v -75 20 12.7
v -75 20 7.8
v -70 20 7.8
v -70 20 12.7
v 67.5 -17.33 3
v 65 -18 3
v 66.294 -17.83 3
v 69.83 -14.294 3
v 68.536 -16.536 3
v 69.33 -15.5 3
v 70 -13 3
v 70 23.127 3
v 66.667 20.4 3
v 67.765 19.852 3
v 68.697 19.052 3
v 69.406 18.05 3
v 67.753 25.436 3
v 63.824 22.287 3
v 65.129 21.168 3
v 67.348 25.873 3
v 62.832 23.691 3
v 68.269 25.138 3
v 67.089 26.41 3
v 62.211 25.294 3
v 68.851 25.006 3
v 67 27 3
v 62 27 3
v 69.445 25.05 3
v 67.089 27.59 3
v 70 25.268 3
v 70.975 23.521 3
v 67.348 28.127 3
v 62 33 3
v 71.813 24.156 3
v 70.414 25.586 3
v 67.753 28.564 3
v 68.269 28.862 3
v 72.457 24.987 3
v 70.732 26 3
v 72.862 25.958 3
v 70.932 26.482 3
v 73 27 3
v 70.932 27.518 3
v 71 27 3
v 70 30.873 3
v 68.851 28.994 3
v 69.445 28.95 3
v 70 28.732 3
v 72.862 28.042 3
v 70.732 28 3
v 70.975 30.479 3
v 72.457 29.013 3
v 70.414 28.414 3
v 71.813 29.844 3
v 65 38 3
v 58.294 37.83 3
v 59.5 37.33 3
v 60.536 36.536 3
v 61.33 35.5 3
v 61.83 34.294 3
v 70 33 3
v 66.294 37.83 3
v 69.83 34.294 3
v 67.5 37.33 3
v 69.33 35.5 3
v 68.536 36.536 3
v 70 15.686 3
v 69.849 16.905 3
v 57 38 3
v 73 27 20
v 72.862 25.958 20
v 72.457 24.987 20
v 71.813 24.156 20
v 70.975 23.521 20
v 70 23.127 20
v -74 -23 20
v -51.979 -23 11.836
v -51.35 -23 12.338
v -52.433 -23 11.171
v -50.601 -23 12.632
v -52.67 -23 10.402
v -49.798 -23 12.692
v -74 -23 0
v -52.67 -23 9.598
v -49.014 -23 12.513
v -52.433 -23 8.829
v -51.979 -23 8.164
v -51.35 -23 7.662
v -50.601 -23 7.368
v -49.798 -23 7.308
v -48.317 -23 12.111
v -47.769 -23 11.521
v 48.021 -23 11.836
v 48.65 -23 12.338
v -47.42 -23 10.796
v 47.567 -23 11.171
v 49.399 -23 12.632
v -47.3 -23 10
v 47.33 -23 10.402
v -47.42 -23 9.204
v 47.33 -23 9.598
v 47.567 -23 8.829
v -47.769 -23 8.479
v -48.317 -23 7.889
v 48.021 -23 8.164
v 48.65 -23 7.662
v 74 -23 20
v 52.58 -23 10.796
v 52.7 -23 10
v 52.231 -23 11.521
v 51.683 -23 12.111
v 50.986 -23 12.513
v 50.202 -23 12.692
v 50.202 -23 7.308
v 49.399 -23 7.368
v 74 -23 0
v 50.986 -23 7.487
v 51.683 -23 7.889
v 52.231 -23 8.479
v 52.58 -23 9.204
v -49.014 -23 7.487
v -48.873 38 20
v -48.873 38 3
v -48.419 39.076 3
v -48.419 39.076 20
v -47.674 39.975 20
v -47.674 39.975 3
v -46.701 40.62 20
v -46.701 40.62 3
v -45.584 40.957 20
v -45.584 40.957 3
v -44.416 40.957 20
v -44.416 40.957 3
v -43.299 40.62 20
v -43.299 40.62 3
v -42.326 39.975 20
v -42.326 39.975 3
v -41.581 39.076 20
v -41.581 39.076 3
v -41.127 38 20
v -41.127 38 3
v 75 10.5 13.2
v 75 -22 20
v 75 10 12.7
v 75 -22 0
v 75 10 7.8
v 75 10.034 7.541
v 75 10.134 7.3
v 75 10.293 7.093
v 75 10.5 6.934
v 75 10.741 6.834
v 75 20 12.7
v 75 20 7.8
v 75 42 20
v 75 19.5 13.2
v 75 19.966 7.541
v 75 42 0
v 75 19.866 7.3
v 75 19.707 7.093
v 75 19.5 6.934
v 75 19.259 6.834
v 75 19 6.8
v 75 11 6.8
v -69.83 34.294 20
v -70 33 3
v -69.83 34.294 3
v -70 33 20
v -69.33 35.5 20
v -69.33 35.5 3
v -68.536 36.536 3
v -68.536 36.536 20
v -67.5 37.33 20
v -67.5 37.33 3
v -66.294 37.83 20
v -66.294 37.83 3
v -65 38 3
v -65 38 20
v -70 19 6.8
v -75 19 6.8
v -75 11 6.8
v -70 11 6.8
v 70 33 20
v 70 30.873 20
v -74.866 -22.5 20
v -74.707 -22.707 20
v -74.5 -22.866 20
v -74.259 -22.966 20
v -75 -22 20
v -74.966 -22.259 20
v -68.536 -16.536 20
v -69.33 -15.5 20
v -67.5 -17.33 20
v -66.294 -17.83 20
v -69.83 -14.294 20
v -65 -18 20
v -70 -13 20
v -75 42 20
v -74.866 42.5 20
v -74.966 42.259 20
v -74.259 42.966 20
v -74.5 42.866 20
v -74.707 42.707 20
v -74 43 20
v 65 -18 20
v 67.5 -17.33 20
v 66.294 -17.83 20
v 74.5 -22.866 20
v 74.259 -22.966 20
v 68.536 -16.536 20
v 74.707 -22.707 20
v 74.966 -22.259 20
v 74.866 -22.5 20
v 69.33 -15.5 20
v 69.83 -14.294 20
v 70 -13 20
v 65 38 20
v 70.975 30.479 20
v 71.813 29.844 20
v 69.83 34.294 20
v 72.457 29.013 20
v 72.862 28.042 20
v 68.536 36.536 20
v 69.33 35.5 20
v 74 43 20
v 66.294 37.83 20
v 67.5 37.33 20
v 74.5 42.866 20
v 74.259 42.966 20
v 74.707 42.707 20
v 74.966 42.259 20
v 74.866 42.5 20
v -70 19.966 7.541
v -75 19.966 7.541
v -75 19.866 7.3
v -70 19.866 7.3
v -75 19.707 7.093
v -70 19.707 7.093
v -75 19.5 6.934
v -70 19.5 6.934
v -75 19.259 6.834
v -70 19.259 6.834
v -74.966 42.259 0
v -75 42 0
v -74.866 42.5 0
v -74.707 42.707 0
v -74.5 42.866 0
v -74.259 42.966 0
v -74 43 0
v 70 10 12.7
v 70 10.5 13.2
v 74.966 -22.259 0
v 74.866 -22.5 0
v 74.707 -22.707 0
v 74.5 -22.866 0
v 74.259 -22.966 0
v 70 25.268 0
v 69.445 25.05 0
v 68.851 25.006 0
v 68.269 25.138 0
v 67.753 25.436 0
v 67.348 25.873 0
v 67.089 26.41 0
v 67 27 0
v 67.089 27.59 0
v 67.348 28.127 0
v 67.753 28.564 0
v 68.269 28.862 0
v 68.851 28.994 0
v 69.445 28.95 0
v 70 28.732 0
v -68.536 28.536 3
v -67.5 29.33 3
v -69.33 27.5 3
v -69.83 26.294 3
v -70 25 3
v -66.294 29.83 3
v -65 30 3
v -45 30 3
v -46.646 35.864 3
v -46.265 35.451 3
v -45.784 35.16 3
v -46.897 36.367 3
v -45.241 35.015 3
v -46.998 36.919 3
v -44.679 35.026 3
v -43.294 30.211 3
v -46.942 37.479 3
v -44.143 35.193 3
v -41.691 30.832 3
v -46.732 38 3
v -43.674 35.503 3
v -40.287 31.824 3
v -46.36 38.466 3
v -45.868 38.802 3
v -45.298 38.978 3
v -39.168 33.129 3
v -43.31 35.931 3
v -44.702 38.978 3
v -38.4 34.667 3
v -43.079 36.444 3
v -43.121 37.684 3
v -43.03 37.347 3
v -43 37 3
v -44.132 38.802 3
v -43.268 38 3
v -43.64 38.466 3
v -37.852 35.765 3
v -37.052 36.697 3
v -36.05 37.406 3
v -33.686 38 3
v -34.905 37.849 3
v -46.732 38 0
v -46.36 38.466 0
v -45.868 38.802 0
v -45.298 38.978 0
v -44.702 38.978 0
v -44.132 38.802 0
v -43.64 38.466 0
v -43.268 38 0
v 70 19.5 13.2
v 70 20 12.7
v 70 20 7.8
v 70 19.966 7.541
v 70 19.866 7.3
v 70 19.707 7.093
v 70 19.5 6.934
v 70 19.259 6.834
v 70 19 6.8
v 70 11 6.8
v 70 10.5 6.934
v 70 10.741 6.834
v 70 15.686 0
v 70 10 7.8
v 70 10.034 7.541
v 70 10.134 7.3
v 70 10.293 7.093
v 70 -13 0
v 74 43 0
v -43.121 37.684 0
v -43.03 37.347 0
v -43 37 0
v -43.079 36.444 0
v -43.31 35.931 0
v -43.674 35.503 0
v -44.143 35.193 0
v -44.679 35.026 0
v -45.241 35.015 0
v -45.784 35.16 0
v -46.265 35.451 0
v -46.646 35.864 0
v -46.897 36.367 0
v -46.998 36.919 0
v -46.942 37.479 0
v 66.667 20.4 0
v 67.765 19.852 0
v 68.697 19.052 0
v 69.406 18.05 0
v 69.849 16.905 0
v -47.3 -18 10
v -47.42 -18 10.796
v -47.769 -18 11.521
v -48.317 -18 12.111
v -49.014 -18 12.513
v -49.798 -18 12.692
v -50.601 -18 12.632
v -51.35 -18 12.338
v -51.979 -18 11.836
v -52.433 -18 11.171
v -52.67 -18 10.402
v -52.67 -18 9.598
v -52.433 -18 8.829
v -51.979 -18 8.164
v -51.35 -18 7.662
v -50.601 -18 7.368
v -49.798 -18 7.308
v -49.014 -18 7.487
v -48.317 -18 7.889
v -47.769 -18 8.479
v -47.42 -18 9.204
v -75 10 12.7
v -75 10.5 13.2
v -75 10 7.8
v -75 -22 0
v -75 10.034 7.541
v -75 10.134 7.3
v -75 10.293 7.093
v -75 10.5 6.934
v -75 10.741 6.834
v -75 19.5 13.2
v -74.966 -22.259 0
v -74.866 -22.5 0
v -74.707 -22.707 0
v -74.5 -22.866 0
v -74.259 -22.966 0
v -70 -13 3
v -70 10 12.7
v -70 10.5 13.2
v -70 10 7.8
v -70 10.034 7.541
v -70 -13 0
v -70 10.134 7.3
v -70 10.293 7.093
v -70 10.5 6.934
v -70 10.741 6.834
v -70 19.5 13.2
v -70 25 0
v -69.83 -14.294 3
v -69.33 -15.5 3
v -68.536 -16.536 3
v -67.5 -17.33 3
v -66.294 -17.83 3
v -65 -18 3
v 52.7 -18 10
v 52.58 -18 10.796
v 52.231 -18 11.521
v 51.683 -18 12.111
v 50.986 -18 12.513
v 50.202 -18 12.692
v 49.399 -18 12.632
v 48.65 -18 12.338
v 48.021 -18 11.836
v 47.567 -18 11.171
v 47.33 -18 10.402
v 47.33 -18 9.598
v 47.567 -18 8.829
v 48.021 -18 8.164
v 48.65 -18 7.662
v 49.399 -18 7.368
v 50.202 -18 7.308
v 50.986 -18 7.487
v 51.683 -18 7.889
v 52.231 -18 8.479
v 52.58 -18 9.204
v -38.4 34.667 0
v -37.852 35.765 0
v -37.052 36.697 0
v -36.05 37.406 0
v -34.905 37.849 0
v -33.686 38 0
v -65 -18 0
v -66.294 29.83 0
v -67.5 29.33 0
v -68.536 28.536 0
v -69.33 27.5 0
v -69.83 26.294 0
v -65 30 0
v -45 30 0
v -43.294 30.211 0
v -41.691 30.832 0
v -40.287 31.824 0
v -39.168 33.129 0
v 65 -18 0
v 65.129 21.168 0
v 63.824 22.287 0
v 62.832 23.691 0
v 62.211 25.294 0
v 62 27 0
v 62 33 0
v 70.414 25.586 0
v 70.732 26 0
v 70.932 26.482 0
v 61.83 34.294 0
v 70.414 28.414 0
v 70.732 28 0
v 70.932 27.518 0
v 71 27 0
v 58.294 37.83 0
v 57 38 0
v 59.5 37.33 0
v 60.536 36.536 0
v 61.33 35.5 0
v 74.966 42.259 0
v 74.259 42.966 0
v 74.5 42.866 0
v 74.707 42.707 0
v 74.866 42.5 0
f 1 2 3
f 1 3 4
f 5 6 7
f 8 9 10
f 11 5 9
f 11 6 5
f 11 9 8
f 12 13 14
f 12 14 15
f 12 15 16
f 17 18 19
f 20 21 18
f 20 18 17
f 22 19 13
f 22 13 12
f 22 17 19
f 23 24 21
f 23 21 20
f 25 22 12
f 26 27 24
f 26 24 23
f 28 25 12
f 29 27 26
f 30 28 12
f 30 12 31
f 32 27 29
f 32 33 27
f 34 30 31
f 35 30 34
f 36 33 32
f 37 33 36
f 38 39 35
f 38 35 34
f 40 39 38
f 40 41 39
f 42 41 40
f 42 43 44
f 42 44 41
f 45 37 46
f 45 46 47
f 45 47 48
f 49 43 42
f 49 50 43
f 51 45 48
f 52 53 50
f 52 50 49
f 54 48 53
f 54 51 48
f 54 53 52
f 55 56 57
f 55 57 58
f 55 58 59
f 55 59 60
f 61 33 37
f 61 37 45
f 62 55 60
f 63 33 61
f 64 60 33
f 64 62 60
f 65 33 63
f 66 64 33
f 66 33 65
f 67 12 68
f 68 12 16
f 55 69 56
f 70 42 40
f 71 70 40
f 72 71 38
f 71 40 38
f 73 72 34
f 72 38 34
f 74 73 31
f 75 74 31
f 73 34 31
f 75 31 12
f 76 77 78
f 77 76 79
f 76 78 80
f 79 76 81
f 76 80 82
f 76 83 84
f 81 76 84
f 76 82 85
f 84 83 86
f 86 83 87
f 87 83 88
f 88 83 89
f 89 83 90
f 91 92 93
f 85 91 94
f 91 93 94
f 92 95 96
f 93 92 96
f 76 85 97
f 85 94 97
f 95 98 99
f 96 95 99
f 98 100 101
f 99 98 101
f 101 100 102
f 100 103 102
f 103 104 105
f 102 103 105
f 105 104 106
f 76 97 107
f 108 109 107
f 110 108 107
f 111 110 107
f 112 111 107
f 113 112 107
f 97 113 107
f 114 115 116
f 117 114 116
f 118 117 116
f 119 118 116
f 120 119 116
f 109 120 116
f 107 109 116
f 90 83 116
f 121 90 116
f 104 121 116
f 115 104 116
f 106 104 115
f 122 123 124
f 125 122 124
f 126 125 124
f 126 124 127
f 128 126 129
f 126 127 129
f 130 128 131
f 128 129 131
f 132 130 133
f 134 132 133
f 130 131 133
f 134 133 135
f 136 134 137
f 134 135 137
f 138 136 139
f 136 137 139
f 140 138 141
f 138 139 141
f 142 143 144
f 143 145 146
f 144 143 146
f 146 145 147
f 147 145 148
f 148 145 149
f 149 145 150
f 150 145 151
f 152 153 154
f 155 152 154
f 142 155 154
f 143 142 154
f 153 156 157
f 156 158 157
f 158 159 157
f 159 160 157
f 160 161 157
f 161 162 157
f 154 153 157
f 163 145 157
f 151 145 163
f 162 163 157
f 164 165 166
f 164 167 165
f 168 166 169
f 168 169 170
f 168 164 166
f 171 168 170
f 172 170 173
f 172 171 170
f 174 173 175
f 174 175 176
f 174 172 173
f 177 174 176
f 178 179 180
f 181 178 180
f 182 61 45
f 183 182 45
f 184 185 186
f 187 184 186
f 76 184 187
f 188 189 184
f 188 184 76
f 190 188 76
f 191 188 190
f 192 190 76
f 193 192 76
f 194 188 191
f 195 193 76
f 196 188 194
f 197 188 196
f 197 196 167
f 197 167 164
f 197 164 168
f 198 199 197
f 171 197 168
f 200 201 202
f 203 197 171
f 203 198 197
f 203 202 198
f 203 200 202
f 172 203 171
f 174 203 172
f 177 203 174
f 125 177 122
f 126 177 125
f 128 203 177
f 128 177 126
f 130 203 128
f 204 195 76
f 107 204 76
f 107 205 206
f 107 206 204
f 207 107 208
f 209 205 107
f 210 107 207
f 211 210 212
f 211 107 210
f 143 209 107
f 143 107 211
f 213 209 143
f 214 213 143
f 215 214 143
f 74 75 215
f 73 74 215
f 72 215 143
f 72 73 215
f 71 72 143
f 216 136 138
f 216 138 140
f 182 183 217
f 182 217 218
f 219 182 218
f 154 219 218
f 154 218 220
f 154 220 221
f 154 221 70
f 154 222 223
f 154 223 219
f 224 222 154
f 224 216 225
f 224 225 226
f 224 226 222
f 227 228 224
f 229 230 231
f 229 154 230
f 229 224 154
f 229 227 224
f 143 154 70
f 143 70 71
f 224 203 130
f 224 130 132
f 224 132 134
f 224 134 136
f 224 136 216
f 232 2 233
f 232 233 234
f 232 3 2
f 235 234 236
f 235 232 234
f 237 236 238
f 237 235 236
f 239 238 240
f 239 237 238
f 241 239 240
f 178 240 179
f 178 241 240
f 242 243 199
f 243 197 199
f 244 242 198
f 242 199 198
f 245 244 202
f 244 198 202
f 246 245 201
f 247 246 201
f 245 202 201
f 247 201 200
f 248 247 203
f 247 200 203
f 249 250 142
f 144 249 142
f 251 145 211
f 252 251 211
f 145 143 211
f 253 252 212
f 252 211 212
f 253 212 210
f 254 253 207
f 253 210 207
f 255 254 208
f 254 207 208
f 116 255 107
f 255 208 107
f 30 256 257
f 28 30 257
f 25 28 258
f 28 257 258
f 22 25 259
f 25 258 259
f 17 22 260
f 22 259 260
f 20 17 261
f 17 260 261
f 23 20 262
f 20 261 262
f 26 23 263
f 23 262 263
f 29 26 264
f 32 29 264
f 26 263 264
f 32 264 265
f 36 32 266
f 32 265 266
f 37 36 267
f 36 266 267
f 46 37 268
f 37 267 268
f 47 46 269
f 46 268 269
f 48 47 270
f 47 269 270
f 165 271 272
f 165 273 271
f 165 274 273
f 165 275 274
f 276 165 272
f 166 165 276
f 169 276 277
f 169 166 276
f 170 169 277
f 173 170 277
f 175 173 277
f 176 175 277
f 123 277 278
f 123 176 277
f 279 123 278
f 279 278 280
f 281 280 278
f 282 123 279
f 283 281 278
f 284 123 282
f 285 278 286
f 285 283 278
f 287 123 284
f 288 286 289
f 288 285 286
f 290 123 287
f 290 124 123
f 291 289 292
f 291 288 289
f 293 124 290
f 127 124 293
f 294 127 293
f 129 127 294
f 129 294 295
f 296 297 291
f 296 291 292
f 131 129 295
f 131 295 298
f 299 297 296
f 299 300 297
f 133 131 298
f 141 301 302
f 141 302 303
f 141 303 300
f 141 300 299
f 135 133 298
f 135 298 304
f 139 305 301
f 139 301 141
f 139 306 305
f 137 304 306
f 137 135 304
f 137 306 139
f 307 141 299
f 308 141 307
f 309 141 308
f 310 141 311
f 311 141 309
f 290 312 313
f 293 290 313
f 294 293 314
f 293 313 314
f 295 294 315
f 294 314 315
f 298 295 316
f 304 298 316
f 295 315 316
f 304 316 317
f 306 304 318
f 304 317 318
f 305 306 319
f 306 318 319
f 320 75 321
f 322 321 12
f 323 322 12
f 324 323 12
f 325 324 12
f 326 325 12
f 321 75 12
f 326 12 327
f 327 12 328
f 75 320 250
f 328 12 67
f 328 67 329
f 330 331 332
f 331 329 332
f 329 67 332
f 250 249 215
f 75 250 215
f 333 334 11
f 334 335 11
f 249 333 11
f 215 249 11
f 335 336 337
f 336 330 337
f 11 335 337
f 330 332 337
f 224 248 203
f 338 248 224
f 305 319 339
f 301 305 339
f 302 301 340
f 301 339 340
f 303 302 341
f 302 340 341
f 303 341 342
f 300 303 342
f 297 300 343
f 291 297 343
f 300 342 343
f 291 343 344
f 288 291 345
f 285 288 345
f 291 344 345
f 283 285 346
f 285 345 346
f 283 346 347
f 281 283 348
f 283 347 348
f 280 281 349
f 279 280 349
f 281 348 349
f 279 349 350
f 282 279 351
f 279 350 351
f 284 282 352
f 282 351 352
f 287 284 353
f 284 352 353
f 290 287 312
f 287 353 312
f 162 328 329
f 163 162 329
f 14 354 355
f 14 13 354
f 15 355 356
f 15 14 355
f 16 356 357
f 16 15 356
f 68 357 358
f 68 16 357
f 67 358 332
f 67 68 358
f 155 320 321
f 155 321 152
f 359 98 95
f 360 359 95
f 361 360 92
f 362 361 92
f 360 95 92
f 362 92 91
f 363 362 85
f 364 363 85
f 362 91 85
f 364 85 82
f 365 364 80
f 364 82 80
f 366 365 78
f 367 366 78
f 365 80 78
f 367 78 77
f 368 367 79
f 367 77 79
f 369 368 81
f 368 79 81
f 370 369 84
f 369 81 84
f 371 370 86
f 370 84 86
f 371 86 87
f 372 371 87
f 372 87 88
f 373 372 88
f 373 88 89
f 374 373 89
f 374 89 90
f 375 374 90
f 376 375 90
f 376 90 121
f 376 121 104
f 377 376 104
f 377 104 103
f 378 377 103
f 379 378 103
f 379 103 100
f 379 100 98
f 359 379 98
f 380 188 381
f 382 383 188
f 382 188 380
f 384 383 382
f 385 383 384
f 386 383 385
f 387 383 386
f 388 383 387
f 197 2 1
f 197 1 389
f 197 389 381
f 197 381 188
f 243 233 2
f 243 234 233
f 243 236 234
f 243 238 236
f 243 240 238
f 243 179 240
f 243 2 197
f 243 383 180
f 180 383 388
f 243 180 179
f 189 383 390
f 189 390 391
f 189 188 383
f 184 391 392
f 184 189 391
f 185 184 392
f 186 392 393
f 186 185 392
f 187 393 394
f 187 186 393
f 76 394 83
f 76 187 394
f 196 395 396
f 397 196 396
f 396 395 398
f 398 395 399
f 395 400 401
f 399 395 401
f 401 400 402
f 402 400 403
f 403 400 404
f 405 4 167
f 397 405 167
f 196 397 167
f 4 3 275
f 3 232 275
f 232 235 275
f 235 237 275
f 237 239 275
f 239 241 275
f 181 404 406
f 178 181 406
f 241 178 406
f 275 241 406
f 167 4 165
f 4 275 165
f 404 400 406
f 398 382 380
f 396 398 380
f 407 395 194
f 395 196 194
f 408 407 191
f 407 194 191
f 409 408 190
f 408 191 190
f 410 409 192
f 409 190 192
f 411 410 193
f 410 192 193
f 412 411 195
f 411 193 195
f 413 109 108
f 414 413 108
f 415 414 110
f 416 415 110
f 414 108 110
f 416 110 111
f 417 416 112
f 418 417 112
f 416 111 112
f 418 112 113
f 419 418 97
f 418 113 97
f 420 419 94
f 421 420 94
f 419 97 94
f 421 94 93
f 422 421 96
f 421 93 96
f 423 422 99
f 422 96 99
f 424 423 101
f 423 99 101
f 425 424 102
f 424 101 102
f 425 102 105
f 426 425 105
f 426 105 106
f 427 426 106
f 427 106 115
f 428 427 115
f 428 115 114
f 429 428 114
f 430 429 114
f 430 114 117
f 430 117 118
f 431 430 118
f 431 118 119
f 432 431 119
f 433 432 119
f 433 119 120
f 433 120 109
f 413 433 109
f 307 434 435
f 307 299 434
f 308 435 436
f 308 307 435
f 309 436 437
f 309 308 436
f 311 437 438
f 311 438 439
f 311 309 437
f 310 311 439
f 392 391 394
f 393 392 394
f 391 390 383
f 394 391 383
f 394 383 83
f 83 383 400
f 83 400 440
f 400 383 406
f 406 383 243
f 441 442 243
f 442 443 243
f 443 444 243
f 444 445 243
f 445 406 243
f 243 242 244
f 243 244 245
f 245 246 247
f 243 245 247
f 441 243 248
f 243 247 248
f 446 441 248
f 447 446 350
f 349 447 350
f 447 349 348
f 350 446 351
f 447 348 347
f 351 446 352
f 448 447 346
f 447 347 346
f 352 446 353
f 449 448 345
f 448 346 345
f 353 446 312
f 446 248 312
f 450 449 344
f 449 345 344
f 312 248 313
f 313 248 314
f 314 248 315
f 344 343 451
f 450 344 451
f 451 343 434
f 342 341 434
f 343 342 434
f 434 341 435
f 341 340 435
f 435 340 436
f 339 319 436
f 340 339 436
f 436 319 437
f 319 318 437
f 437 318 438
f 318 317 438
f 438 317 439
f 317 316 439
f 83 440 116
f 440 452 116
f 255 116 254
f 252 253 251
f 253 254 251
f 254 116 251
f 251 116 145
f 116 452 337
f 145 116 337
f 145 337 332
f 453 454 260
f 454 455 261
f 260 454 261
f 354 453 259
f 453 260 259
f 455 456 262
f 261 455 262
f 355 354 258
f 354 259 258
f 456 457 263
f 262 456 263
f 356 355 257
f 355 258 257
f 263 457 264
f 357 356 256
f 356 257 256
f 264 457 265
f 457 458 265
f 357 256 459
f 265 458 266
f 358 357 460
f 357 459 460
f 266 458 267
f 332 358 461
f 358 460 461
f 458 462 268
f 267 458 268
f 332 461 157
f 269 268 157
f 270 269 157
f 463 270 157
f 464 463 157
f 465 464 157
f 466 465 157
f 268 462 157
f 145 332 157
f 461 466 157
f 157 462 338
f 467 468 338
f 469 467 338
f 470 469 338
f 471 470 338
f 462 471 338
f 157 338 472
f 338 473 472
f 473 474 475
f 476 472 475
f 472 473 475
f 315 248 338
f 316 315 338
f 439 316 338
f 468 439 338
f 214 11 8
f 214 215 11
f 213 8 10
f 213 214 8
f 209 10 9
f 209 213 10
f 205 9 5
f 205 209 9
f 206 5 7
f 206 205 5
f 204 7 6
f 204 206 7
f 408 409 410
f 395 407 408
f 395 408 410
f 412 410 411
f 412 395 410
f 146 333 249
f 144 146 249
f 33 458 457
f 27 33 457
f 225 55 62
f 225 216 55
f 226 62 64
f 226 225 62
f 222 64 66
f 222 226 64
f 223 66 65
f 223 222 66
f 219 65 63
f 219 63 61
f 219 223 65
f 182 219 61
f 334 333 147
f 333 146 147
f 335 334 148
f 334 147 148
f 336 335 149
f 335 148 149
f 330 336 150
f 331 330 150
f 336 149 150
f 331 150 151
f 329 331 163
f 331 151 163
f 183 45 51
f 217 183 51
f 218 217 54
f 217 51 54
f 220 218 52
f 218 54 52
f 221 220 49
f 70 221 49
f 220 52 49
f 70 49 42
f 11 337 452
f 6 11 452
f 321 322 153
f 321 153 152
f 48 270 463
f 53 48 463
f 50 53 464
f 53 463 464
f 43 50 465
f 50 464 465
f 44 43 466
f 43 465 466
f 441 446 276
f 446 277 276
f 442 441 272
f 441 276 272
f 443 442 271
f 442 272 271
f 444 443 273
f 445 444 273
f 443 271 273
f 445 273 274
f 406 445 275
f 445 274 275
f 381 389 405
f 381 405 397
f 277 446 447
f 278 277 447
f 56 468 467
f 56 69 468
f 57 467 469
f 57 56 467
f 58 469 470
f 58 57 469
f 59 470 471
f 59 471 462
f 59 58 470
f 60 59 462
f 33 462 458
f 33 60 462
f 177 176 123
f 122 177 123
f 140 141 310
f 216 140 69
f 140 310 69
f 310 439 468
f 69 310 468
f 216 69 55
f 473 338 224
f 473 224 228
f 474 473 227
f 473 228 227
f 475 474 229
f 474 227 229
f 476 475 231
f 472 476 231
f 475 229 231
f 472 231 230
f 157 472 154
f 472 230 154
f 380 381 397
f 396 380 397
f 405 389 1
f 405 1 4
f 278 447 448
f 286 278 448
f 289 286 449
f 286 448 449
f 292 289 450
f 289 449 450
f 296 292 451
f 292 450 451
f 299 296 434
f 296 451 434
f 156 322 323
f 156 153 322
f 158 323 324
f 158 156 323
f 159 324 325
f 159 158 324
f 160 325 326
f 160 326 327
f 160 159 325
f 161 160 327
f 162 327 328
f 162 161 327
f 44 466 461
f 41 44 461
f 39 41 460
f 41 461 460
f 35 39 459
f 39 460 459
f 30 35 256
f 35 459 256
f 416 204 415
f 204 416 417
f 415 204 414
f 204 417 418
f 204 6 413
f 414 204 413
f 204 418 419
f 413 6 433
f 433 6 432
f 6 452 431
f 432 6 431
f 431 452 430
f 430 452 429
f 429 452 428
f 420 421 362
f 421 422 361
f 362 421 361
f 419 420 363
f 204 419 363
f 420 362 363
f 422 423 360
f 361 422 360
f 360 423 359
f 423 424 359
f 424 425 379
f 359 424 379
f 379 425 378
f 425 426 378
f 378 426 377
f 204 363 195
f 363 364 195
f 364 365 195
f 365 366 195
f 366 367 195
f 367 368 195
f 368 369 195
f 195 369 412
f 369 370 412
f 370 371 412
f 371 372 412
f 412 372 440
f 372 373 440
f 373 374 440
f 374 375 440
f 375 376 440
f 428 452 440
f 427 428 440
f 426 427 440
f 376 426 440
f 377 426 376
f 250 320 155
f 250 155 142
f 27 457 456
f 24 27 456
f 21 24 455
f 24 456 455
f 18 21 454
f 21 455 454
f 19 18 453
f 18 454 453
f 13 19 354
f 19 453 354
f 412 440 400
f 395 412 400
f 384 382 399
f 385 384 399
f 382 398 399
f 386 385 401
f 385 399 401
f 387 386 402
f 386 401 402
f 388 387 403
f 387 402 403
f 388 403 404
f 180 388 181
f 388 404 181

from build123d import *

# Parameters (mm, degrees)
F1_W     = 150
F1_H     = 66
F2_DEPTH = 20
F3_DEPTH = 3
F4_R     = 2.7
F6_DEPTH = 25
F5_W     = 10
F5_H     = 6.4
F7_DEPTH = 160
F8_R     = 5
F9_R     = 1
F10_SIZE = 0.5


with BuildPart() as f2:
    # F1 (on Top) → F2 (new body)
    with BuildSketch(Plane.XY):
        with Locations((0, 10)):
            Rectangle(F1_W, F1_H)
        with BuildLine():
            Line((70, 23.1270166538), (70, 20.0717967697))
            Line((70, 20.0717967697), (70, -13))
            Line((70, -13), (70, -18))
            Line((70, -18), (65, -18))
            Line((65, -18), (-65, -18))
            Line((-65, -18), (-70, -18))
            Line((-70, -18), (-70, -13))
            Line((-70, -13), (-70, 30))
            Line((-70, 30), (-70, 38))
            Line((-70, 38), (-48.8729833462, 38))
            ThreePointArc((-48.8729833462, 38), (-45, 41), (-41.1270166538, 38))
            Line((-41.1270166538, 38), (-38.0717967697, 38))
            Line((-38.0717967697, 38), (62, 38))
            Line((62, 38), (70, 38))
            Line((70, 38), (70, 30.8729833462))
            ThreePointArc((70, 30.8729833462), (72.1622776602, 29.4494897428), (73, 27))
            ThreePointArc((73, 27), (72.1622776602, 24.5505102572), (70, 23.1270166538))
        make_face(mode=Mode.SUBTRACT)
    extrude(amount=F2_DEPTH)

    # F1 (on Top) → F3 (join)
    with BuildSketch(Plane.XY):
        with BuildLine():
            ThreePointArc((-45, 30), (-39.7084973779, 32.417424305), (-38.0717967697, 38))
            Line((-38.0717967697, 38), (-41.1270166538, 38))
            ThreePointArc((-41.1270166538, 38), (-41.0318812149, 37.5040171699), (-41, 37))
            ThreePointArc((-41, 37), (-45.5040171699, 33.0318812149), (-48.8729833462, 38))
            Line((-48.8729833462, 38), (-70, 38))
            Line((-70, 38), (-70, 30))
            Line((-70, 30), (-45, 30))
        make_face()
        with BuildLine():
            ThreePointArc((62, 27), (64.417424305, 21.7084973779), (70, 20.0717967697))
            Line((70, 20.0717967697), (70, 23.1270166538))
            ThreePointArc((70, 23.1270166538), (65, 27), (70, 30.8729833462))
            Line((70, 30.8729833462), (70, 38))
            Line((70, 38), (62, 38))
            Line((62, 38), (62, 27))
        make_face()
        with BuildLine():
            Line((70, 25.2679491924), (70, 23.1270166538))
            ThreePointArc((70, 23.1270166538), (72.1622776602, 24.5505102572), (73, 27))
            ThreePointArc((73, 27), (72.1622776602, 29.4494897428), (70, 30.8729833462))
            Line((70, 30.8729833462), (70, 28.7320508076))
            ThreePointArc((70, 28.7320508076), (70.7320508076, 28), (71, 27))
            ThreePointArc((71, 27), (70.7320508076, 26), (70, 25.2679491924))
        make_face()
        with BuildLine():
            ThreePointArc((70, 30.8729833462), (65, 27), (70, 23.1270166538))
            Line((70, 23.1270166538), (70, 25.2679491924))
            ThreePointArc((70, 25.2679491924), (67, 27), (70, 28.7320508076))
            Line((70, 28.7320508076), (70, 30.8729833462))
        make_face()
        with BuildLine():
            ThreePointArc((-41, 37), (-41.0318812149, 37.5040171699), (-41.1270166538, 38))
            Line((-41.1270166538, 38), (-43.2679491924, 38))
            ThreePointArc((-43.2679491924, 38), (-43.0681483474, 37.5176380902), (-43, 37))
            ThreePointArc((-43, 37), (-45.5176380902, 35.0681483474), (-46.7320508076, 38))
            Line((-46.7320508076, 38), (-48.8729833462, 38))
            ThreePointArc((-48.8729833462, 38), (-45.5040171699, 33.0318812149), (-41, 37))
        make_face()
        with BuildLine():
            Line((-43.2679491924, 38), (-41.1270166538, 38))
            ThreePointArc((-41.1270166538, 38), (-45, 41), (-48.8729833462, 38))
            Line((-48.8729833462, 38), (-46.7320508076, 38))
            ThreePointArc((-46.7320508076, 38), (-45, 39), (-43.2679491924, 38))
        make_face()
        Polygon((-70, -18), (-65, -18), (-70, -13), align=None)
        Polygon((70, -18), (70, -13), (65, -18), align=None)
    extrude(amount=F3_DEPTH)

    # F4 (on face) → F6 (cut)
    with BuildSketch(Plane.XZ.offset(23)):
        with Locations((-50, 10)):
            Circle(F4_R)
        with Locations((50, 10)):
            Circle(F4_R)
    extrude(amount=-F6_DEPTH, mode=Mode.SUBTRACT)

    # F5 (on face) → F7 (cut)
    with BuildSketch(Plane(origin=(-75, 0, 0), x_dir=(0, -1, 0), z_dir=(-1, 0, 0))):
        with Locations((-15, 10)):
            Rectangle(F5_W, F5_H)
    extrude(amount=-F7_DEPTH, mode=Mode.SUBTRACT)

    # F8
    f8_edges = [f2.edges().sort_by_distance(p)[0] for p in [
        (62, 38, 1.5),
        (-70, 30, 1.5),
        (70, 38, 11.5),
        (-70, 38, 11.5),
        (-70, -18, 11.5),
        (70, -18, 11.5),
        (-38.071797, 38, 1.5),
        (70, 20.071797, 1.5),
    ]]
    fillet(f8_edges, radius=F8_R)

    # F9
    f9_edges = [f2.edges().sort_by_distance(p)[0] for p in [
        (-75, 43, 10),
        (-75, -23, 10),
        (75, -23, 10),
        (75, 43, 10),
        (-72.5, 10, 6.8),
        (-72.5, 20, 6.8),
        (72.5, 20, 6.8),
        (72.5, 10, 6.8),
    ]]
    fillet(f9_edges, radius=F9_R)

    # F10
    f10_edges = [f2.edges().sort_by_distance(p)[0] for p in [
        (-72.5, 10, 13.2),
        (-72.5, 20, 13.2),
        (72.5, 20, 13.2),
        (72.5, 10, 13.2),
    ]]
    chamfer(f10_edges, length=F10_SIZE)


solid = f2.part
